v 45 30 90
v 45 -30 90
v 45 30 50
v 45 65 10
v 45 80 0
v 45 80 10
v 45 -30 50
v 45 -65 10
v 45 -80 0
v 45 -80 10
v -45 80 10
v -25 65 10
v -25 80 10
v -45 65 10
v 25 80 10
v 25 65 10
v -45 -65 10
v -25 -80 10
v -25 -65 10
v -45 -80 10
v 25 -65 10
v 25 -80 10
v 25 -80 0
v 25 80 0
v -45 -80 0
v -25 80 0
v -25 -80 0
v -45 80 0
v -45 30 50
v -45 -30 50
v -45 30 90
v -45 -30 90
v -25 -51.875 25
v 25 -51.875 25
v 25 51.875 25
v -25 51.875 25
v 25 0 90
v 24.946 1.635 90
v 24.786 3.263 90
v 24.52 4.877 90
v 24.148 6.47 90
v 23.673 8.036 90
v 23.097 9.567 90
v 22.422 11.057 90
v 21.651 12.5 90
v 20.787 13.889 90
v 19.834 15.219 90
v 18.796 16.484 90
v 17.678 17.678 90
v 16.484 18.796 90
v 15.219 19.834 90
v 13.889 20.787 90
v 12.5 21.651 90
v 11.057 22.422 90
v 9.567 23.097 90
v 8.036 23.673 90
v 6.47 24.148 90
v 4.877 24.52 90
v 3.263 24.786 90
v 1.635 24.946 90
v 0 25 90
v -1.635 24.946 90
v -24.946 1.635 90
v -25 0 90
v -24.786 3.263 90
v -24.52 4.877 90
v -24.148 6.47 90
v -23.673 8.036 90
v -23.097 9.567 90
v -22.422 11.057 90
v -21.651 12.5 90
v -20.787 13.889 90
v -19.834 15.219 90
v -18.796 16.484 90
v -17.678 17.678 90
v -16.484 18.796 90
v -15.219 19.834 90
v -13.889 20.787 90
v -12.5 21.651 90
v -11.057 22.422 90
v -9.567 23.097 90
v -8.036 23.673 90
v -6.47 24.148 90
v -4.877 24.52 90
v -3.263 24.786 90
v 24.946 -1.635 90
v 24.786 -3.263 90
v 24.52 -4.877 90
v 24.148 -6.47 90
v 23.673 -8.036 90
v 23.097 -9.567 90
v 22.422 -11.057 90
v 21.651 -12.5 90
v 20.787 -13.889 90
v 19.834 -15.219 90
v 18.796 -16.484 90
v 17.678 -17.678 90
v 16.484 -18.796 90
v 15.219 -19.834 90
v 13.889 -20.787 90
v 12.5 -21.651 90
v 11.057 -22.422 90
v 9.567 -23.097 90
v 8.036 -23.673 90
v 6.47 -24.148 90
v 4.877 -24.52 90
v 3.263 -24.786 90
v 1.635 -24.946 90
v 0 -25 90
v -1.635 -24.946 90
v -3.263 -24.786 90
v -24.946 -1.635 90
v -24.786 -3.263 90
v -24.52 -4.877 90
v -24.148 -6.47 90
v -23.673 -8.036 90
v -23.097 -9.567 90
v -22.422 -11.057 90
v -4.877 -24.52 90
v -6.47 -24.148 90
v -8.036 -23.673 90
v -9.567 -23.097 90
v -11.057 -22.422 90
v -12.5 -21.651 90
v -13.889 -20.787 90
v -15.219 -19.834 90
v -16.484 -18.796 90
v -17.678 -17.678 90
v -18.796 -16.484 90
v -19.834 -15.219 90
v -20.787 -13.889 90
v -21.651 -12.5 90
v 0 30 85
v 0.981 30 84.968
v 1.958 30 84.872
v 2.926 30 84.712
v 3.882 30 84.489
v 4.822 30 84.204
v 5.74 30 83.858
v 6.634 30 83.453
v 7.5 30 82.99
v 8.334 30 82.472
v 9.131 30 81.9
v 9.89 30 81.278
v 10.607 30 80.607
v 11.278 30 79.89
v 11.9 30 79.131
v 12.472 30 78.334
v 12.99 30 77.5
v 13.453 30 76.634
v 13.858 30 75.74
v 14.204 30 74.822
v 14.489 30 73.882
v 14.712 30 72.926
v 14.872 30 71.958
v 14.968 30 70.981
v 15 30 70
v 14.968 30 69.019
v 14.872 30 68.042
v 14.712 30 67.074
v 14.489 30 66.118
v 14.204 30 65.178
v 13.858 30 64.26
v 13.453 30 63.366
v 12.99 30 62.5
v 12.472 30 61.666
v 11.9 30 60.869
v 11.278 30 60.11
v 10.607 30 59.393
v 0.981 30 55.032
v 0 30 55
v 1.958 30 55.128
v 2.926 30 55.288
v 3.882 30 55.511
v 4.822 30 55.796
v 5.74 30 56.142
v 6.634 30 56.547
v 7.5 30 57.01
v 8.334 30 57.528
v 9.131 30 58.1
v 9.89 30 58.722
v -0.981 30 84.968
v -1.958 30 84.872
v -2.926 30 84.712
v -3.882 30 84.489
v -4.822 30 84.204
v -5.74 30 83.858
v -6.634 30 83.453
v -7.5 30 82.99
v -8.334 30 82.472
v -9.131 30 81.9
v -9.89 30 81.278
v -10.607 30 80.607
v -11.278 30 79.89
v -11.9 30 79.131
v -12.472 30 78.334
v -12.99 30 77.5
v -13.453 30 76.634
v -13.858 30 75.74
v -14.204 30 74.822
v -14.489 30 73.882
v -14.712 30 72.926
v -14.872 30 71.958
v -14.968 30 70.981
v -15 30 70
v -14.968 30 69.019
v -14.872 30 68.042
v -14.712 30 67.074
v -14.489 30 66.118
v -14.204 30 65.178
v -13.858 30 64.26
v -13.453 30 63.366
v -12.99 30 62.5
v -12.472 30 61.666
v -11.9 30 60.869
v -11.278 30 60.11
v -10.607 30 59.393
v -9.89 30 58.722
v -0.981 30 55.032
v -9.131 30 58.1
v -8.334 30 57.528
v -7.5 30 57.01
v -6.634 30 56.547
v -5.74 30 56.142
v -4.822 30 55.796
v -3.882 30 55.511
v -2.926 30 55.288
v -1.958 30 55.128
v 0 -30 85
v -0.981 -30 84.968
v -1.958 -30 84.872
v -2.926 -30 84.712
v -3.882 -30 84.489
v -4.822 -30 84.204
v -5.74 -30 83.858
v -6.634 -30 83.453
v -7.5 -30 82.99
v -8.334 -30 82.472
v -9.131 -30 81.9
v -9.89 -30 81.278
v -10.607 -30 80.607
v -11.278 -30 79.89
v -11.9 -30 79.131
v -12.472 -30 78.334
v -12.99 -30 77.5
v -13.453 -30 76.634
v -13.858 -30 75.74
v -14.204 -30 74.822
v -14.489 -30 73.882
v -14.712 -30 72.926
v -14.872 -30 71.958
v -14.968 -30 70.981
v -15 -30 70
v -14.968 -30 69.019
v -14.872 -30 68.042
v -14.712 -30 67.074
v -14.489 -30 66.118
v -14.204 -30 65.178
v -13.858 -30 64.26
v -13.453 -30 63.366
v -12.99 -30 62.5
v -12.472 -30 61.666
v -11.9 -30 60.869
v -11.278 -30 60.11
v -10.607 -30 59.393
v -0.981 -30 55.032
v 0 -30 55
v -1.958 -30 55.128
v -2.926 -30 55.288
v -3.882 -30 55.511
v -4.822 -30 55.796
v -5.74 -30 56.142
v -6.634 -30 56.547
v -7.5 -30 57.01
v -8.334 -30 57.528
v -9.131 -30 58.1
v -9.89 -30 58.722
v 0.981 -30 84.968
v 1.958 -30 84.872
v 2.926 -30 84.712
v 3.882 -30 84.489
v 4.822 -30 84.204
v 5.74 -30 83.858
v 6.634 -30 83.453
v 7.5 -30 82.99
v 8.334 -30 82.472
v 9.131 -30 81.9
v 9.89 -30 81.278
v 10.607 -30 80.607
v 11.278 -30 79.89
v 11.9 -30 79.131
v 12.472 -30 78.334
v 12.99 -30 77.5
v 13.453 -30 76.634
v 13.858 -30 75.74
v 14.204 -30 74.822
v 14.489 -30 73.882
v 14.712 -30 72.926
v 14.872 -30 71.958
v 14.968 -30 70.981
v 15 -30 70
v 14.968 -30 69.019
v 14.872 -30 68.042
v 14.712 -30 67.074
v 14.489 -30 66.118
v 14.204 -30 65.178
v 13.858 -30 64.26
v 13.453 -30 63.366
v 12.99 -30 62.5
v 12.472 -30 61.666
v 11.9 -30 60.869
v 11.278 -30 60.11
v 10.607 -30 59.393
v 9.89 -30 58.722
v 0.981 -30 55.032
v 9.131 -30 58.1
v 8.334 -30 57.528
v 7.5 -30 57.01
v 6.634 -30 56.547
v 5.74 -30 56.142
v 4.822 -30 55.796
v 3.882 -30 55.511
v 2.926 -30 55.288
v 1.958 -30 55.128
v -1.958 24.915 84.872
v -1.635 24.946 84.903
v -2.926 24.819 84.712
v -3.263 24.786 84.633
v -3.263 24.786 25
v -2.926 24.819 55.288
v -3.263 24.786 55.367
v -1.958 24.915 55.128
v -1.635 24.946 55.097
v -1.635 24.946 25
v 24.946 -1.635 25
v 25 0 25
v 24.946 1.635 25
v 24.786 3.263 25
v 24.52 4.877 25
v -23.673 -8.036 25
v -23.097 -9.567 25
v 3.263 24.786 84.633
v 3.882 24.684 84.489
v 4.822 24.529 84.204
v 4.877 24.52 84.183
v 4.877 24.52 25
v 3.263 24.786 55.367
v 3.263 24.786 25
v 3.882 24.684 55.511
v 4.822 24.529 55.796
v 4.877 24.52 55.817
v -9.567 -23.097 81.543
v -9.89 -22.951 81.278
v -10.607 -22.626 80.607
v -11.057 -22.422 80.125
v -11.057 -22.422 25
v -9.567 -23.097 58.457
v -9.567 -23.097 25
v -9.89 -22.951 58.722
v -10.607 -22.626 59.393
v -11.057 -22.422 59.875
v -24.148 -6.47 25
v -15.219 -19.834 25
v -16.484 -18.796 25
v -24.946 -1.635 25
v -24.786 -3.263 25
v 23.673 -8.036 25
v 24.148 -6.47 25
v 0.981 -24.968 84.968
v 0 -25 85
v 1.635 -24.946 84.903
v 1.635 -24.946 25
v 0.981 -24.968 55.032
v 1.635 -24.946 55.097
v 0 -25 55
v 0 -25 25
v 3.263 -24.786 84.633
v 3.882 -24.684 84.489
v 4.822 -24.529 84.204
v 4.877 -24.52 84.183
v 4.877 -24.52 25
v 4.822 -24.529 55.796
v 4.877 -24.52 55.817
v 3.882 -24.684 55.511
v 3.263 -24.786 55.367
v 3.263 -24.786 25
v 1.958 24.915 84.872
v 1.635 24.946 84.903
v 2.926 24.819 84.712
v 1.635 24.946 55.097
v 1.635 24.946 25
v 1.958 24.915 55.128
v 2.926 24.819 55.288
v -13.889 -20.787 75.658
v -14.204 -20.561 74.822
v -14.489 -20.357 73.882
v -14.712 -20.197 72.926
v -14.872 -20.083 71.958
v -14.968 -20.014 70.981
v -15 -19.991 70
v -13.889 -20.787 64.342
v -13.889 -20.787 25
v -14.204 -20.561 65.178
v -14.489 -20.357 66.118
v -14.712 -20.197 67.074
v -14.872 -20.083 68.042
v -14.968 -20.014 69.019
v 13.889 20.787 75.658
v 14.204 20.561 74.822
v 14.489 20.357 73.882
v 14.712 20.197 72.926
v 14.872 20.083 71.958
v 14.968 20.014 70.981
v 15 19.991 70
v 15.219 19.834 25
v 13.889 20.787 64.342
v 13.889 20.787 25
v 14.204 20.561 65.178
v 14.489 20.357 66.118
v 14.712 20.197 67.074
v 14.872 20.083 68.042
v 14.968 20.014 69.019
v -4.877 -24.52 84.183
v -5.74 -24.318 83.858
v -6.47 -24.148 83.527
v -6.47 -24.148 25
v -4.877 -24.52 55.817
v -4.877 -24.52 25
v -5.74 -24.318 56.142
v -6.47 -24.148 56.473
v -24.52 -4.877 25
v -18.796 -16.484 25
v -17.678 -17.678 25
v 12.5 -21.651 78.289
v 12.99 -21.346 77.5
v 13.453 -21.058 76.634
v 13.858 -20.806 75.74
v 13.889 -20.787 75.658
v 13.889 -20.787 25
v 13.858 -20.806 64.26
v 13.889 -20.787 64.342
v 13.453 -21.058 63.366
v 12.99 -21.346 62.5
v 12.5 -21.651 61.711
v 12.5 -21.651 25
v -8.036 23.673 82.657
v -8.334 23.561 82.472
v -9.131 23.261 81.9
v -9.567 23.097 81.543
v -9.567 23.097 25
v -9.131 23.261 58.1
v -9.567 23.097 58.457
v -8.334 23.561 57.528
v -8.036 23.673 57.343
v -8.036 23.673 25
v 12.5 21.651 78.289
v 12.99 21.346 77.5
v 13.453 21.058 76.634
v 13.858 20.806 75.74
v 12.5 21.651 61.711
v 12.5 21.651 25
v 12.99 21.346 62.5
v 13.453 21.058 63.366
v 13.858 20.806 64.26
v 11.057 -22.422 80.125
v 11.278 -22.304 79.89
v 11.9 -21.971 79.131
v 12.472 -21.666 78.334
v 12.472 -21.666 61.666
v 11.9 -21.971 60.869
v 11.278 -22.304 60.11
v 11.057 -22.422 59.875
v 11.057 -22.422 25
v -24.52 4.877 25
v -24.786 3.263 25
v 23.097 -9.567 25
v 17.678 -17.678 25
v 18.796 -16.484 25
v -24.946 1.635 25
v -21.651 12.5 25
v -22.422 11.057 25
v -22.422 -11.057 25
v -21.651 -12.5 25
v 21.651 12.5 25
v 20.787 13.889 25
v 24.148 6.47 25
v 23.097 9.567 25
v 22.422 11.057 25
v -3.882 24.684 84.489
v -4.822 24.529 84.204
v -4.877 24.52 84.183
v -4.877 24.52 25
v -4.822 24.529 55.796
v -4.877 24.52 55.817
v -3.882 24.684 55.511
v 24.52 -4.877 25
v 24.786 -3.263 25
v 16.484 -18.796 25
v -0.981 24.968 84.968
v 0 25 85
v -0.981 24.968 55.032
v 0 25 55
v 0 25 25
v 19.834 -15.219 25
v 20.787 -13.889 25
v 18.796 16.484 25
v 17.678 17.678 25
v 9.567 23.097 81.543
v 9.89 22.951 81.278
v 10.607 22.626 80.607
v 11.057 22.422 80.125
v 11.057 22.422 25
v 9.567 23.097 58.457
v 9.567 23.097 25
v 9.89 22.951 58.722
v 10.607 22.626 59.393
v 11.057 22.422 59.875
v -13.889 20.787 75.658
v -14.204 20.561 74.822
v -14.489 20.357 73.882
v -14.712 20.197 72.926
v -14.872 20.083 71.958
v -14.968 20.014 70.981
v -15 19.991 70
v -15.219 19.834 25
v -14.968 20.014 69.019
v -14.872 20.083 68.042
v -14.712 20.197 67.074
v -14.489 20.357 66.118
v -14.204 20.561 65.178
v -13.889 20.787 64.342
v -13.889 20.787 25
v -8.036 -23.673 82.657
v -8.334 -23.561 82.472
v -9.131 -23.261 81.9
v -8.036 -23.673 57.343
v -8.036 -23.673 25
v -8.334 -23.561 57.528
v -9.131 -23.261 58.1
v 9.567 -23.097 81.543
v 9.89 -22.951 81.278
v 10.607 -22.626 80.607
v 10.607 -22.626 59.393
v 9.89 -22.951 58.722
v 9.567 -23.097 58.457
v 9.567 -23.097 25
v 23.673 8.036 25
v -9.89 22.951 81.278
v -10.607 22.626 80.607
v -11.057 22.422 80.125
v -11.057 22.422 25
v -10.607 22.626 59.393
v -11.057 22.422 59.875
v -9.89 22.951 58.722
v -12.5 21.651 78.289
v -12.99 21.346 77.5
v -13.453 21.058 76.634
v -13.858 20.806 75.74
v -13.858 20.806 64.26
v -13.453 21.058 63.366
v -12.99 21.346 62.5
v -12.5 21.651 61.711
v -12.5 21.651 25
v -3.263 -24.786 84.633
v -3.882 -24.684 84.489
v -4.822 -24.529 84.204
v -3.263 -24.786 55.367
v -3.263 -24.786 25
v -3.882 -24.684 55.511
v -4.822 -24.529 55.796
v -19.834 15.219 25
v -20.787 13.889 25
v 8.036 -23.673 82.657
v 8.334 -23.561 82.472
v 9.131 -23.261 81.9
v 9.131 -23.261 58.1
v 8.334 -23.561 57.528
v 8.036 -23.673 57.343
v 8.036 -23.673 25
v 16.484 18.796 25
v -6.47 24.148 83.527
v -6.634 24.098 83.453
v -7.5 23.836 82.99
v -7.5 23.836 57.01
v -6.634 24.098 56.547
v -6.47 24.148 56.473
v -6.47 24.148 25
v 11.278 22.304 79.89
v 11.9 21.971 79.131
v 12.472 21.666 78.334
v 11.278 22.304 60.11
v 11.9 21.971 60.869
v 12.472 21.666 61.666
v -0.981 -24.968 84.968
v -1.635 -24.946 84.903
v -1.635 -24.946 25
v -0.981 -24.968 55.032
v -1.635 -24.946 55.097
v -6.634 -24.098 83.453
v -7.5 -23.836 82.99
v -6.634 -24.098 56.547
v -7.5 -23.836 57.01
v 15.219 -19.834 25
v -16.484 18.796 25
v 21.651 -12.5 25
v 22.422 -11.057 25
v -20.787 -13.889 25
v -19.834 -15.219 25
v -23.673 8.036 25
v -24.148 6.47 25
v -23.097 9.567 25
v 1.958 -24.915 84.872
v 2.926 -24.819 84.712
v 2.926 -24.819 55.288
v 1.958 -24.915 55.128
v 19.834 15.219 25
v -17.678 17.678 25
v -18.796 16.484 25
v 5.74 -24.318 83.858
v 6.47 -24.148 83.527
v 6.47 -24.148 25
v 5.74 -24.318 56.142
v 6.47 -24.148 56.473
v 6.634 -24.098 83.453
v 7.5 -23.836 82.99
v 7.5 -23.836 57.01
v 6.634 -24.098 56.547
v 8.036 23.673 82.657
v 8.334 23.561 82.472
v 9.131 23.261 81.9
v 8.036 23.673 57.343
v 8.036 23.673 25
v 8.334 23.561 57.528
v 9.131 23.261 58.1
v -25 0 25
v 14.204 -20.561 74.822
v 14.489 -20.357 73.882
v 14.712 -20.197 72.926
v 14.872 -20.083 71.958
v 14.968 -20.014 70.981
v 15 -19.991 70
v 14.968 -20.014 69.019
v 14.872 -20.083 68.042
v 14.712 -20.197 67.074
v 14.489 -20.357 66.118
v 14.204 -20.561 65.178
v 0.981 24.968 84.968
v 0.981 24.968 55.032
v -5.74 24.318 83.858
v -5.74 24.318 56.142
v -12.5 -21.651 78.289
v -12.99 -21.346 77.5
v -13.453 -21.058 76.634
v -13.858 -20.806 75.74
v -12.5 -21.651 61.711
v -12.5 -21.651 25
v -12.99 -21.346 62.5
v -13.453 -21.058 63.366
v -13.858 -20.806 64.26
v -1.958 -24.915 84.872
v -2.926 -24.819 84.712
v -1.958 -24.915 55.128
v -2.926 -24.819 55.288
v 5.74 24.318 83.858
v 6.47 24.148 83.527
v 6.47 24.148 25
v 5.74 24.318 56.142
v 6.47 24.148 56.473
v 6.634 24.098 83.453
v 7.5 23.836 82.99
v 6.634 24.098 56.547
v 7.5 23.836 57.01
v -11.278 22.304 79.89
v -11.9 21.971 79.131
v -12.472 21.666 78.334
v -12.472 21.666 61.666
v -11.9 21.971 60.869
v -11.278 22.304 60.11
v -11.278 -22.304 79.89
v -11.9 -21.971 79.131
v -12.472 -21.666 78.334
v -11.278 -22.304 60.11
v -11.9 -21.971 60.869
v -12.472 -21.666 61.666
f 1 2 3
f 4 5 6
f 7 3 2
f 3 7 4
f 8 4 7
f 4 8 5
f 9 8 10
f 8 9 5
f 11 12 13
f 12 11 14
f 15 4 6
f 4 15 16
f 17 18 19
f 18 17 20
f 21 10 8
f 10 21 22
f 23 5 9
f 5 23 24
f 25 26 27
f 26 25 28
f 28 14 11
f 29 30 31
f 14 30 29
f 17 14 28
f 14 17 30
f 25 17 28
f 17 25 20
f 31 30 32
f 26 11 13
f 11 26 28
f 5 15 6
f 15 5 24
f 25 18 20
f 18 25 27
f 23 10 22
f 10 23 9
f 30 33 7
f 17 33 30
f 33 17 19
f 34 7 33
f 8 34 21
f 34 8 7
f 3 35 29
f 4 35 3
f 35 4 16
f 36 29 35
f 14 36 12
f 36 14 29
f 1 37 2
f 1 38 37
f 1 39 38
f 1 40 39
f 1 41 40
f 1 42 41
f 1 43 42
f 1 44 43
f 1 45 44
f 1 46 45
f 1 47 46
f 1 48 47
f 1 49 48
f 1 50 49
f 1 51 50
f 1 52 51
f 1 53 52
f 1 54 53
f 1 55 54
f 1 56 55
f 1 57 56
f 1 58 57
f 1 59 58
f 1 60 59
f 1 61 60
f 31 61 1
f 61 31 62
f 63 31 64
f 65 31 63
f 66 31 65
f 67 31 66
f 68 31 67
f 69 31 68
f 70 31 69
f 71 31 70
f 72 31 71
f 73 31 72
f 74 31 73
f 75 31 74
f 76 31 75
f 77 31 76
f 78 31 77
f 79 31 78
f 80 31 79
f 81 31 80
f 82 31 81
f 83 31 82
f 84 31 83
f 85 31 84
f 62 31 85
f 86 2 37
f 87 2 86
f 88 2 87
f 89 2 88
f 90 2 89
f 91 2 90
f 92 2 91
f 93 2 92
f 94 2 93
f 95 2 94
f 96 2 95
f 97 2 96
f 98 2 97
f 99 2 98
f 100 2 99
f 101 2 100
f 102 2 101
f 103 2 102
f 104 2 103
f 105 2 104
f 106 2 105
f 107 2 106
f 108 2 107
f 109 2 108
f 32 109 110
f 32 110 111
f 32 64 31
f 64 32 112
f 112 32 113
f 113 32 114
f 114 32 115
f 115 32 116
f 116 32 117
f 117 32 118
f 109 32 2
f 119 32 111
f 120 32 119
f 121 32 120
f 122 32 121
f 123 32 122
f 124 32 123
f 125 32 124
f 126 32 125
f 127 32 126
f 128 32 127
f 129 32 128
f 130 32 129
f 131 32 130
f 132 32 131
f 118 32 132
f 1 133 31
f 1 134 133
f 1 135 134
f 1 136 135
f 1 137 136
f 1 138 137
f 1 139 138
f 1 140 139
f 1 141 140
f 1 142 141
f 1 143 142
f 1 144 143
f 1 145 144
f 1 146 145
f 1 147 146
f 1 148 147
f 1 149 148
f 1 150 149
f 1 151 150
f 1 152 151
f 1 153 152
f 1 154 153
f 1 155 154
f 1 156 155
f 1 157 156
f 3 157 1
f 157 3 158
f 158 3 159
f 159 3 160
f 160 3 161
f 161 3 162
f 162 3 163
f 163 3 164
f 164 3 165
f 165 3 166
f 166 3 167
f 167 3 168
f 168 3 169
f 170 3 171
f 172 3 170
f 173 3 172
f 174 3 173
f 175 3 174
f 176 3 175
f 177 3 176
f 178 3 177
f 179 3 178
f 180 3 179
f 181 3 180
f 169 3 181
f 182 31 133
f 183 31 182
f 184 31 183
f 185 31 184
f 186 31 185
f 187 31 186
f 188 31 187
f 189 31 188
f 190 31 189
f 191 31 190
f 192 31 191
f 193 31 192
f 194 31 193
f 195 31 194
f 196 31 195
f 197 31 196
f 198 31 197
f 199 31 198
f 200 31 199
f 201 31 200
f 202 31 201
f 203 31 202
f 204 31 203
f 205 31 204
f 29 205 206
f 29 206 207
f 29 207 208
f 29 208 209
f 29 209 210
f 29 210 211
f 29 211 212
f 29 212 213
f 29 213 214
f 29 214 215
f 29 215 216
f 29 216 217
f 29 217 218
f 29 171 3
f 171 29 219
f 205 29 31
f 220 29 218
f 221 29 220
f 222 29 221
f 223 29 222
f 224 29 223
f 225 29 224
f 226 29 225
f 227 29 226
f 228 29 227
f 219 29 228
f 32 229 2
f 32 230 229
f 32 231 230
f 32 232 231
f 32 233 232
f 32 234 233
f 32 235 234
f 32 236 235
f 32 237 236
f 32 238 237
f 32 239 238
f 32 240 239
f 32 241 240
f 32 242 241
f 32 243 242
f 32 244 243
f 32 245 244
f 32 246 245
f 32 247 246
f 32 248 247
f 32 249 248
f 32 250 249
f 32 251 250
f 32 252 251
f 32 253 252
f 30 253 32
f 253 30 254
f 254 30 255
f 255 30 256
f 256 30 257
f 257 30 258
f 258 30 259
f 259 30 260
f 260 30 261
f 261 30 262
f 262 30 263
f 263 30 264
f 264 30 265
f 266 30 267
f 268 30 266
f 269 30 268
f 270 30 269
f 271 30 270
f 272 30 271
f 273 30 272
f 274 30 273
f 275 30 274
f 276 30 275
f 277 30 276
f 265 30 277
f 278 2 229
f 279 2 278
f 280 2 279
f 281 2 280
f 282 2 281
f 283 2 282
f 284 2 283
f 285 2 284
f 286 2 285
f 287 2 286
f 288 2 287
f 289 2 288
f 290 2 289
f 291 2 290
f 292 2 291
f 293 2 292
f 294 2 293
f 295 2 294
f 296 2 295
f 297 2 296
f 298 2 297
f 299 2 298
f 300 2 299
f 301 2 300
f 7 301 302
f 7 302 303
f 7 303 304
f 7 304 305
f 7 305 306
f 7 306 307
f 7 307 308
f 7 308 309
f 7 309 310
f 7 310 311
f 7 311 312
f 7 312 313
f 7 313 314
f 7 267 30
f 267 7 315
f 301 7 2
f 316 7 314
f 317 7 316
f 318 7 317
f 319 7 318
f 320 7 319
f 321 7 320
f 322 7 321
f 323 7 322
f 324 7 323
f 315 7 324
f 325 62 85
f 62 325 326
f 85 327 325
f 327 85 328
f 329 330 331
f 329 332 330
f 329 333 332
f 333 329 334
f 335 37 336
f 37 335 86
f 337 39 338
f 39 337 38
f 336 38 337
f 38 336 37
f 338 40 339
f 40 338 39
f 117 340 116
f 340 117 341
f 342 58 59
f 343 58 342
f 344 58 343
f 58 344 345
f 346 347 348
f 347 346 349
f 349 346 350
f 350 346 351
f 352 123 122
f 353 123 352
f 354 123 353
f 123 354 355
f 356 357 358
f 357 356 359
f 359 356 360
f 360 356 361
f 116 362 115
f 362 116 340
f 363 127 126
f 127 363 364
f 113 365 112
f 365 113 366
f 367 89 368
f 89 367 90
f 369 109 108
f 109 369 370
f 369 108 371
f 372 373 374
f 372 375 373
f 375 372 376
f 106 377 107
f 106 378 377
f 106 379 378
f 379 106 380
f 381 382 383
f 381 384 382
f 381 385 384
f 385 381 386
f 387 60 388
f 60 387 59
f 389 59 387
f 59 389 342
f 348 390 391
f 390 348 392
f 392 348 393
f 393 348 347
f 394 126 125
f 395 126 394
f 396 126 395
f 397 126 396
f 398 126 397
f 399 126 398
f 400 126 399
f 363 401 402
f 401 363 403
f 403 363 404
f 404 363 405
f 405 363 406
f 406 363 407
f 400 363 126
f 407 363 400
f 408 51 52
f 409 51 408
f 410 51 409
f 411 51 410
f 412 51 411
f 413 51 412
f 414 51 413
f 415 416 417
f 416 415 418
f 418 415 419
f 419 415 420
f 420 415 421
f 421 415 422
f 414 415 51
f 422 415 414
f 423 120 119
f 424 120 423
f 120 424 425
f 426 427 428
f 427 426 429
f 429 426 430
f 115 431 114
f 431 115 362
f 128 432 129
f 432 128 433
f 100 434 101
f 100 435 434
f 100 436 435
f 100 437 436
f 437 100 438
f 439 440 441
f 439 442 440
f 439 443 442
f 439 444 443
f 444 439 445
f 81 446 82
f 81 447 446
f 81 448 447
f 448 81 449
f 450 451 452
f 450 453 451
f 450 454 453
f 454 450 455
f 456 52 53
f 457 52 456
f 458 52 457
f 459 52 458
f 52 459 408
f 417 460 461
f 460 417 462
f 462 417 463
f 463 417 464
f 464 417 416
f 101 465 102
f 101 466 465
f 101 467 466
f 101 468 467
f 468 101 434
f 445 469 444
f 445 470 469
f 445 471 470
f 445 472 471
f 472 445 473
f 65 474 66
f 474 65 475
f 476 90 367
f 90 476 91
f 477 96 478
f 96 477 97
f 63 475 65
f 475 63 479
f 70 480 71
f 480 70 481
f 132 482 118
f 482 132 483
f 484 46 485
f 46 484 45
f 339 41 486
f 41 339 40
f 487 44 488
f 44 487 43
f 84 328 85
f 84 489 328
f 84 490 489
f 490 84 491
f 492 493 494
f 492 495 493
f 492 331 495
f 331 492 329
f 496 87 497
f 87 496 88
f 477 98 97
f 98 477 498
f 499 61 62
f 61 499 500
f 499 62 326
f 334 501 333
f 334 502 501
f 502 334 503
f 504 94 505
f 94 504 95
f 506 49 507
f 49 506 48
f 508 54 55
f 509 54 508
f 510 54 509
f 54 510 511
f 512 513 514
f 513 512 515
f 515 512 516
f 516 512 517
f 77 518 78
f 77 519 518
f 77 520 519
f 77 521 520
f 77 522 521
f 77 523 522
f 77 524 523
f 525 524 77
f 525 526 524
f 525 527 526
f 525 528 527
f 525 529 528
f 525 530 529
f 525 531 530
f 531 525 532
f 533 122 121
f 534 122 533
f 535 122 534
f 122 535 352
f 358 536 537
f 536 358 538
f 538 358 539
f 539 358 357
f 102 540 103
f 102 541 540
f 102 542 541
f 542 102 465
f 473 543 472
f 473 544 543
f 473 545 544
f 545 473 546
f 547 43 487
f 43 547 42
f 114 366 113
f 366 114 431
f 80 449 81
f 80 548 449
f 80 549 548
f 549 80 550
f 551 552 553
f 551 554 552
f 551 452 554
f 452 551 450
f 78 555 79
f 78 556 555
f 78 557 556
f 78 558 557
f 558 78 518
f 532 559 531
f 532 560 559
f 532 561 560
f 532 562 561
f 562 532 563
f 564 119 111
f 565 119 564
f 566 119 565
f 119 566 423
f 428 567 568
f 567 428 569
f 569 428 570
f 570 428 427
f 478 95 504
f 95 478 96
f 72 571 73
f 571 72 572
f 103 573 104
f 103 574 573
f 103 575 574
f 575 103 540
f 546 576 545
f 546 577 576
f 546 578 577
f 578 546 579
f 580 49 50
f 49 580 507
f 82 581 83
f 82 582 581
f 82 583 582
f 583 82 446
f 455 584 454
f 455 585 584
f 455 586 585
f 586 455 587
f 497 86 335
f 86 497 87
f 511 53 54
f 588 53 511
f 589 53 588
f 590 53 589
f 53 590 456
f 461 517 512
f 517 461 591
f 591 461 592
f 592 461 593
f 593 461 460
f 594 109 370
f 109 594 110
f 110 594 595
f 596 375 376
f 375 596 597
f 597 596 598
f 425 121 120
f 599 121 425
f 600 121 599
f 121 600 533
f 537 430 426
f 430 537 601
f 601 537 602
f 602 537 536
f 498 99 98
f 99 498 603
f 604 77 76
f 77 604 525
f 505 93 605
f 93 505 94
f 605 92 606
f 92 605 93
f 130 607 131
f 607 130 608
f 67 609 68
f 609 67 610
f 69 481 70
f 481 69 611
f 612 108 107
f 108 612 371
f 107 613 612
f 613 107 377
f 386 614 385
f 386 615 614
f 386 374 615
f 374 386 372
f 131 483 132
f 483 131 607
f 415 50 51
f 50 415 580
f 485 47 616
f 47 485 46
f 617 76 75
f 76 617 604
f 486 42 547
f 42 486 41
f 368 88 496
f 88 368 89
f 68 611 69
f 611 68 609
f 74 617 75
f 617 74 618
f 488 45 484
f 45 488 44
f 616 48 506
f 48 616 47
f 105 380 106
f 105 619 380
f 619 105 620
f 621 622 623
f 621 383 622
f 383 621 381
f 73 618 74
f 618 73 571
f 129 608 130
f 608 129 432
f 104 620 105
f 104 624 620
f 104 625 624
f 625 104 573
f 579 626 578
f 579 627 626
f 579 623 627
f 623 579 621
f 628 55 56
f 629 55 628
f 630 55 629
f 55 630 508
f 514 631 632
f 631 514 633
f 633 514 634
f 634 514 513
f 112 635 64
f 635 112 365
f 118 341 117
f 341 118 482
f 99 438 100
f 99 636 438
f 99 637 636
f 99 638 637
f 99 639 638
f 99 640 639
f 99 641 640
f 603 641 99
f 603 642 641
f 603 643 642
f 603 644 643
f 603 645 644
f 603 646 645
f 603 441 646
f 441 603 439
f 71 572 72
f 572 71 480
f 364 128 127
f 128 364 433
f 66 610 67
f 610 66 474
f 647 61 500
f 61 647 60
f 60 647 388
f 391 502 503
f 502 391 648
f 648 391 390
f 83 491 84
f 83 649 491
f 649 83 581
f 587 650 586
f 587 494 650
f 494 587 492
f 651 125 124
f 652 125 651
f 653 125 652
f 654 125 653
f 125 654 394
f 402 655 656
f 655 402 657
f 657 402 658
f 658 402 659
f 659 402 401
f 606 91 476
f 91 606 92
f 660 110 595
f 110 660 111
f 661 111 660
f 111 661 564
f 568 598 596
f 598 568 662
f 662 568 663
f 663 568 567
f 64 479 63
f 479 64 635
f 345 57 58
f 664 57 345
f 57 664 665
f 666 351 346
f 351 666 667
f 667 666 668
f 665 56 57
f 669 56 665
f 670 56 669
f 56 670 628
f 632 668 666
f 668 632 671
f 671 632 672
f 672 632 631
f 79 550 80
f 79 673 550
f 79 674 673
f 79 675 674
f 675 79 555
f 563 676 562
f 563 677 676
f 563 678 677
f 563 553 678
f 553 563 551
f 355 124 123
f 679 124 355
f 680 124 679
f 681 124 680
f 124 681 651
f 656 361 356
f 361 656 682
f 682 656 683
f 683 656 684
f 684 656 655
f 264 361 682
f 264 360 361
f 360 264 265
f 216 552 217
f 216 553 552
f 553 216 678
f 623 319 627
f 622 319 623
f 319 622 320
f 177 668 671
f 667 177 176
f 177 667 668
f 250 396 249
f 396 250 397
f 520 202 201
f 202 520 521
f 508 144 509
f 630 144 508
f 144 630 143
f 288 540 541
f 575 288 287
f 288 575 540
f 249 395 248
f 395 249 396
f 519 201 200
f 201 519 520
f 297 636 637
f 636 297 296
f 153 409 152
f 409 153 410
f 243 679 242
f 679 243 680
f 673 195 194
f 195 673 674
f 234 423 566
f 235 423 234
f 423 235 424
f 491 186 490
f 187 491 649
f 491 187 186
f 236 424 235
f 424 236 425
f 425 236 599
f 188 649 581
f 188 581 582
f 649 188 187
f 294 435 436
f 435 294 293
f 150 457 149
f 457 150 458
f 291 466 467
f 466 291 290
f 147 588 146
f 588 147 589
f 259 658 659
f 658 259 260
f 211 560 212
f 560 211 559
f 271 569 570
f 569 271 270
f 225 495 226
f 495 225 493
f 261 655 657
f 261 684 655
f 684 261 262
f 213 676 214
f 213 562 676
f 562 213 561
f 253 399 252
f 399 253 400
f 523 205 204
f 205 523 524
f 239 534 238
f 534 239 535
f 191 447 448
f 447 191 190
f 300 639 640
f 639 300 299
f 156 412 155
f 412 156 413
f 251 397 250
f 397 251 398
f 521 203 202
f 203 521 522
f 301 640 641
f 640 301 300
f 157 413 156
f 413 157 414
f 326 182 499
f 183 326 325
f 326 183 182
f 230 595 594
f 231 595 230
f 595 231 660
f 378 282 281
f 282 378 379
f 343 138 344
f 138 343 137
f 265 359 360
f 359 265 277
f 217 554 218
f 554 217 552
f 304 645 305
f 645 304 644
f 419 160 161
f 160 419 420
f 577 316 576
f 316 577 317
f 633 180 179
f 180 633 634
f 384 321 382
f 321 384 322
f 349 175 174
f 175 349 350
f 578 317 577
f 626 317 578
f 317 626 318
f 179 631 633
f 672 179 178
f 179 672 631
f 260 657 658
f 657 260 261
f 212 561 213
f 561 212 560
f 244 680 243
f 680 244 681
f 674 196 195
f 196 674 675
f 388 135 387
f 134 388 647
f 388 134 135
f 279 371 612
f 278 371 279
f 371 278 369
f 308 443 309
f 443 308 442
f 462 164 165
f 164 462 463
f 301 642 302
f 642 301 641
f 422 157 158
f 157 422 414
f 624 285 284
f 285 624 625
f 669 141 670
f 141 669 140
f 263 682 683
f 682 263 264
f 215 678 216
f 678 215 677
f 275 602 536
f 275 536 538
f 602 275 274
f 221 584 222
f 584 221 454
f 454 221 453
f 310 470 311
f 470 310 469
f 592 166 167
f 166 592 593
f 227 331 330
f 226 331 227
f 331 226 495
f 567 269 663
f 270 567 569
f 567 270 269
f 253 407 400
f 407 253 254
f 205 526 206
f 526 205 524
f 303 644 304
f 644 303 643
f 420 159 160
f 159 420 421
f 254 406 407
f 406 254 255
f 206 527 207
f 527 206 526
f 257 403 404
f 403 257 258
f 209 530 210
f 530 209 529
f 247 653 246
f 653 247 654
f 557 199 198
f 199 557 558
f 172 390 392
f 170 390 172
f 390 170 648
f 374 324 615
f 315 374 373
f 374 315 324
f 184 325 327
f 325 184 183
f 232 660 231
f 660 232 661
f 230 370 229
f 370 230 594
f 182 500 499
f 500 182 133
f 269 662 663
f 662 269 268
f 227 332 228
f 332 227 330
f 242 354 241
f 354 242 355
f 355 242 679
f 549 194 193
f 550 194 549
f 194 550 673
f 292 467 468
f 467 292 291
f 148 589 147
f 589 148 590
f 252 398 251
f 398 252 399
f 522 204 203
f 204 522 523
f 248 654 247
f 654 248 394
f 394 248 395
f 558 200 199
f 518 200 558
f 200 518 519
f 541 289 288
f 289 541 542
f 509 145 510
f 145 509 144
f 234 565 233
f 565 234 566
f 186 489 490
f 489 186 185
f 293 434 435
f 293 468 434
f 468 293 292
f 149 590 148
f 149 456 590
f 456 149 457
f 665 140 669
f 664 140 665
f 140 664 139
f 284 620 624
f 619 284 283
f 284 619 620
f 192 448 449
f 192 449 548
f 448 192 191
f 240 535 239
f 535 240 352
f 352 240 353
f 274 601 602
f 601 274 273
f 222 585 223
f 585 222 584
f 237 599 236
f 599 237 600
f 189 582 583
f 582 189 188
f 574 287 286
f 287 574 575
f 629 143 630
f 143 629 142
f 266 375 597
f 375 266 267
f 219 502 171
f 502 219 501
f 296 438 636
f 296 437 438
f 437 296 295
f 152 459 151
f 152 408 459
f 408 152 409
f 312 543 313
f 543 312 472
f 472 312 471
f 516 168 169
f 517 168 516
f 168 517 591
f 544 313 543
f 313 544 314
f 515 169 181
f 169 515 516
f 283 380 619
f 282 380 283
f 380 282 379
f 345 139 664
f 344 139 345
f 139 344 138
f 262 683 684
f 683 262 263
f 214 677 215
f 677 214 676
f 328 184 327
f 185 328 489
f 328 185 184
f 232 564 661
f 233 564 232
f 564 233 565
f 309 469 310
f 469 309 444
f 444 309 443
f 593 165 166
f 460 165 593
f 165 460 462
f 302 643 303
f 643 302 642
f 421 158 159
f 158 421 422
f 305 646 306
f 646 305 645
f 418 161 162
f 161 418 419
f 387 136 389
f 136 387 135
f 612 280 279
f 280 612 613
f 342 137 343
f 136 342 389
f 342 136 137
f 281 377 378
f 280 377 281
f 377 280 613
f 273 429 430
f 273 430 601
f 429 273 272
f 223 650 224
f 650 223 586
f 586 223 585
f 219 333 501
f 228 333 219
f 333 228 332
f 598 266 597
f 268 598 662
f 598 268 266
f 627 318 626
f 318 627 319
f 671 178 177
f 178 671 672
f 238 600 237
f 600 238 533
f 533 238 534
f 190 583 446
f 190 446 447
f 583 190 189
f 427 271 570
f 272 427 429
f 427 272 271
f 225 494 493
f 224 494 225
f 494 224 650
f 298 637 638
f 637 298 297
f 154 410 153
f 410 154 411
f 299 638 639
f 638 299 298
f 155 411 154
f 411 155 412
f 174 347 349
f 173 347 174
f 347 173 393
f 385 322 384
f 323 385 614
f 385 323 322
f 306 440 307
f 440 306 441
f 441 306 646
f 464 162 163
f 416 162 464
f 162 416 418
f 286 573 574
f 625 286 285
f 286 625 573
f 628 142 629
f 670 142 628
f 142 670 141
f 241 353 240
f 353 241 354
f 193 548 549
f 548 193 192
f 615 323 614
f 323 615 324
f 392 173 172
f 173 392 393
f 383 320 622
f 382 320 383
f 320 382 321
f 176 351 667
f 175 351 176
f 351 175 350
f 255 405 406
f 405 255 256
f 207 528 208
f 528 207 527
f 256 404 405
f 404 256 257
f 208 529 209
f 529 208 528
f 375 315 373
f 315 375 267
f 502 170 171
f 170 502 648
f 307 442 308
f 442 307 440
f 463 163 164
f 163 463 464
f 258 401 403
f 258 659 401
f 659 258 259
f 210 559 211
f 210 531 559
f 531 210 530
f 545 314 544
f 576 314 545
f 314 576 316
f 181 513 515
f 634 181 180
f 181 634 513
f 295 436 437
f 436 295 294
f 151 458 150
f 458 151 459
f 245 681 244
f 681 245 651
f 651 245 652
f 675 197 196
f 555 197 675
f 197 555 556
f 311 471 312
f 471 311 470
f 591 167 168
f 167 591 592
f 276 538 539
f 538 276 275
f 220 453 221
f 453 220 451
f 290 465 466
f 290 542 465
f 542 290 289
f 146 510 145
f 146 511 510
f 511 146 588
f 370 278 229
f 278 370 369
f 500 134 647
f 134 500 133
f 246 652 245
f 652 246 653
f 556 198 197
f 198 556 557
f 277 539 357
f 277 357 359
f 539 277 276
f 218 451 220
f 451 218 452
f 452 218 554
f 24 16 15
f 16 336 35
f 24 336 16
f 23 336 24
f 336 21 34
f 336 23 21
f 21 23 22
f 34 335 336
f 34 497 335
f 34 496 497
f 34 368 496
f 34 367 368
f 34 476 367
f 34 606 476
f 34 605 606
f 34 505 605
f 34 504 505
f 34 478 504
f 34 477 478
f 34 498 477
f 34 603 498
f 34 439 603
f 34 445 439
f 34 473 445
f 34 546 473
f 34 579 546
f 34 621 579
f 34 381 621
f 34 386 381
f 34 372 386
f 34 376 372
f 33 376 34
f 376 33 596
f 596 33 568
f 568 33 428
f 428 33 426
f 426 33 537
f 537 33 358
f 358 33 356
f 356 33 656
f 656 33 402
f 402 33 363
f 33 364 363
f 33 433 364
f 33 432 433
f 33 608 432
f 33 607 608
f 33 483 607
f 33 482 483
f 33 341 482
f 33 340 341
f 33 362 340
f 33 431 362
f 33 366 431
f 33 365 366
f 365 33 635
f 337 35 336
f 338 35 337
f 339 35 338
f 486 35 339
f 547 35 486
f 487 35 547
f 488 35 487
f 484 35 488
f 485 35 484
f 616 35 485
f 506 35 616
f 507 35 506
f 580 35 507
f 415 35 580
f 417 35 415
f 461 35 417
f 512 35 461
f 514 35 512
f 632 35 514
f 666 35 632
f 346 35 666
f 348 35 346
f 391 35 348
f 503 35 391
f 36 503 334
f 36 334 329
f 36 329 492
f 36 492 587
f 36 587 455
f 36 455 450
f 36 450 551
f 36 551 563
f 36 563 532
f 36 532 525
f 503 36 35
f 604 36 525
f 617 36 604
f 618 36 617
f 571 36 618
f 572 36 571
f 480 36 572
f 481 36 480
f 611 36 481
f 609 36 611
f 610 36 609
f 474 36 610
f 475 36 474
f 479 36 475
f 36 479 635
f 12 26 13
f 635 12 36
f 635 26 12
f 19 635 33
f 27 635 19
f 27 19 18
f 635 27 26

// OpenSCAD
$fn = 96;


base_x = 90;
base_y = 160;
base_z = 10;

trap_x = 90;
trap_y_bottom = 130;
trap_y_top = 60;
trap_z = 40;
trap_y_shift = 0;

top_x = 90;
top_y = 60;
top_z = 40;

top_y_shift = trap_y_shift;

hole_z_d = 50;
hole_z_x = 0;
hole_z_y = 0;

hole_y_d = 30;
hole_y_x = 0;

hole_y_z = base_z + trap_z + top_z / 2;

slot_x = 50;
slot_y = 162;
slot_z = 25;

slot_y_start = -base_y / 2 - 1;

eps = 0.2;


module base_block() {
    translate([-base_x / 2, -base_y / 2, 0])
        cube([base_x, base_y, base_z]);
}


module top_block() {
    translate([
        -top_x / 2,
        top_y_shift - top_y / 2,
        base_z + trap_z
    ])
        cube([top_x, top_y, top_z]);
}


module trapezoid_body() {
    x0 = -trap_x / 2;
    x1 =  trap_x / 2;

    z0 = base_z;
    z1 = base_z + trap_z;

    yb0 = -trap_y_bottom / 2;
    yb1 =  trap_y_bottom / 2;

    yt0 = trap_y_shift - trap_y_top / 2;
    yt1 = trap_y_shift + trap_y_top / 2;

    polyhedron(
        points = [
            [x0, yb0, z0],
            [x1, yb0, z0],
            [x1, yb1, z0],
            [x0, yb1, z0],

            [x0, yt0, z1],
            [x1, yt0, z1],
            [x1, yt1, z1],
            [x0, yt1, z1]
        ],
        faces = [
            [0, 1, 2, 3],
            [4, 7, 6, 5],

            [0, 4, 5, 1],
            [1, 5, 6, 2],
            [2, 6, 7, 3],
            [3, 7, 4, 0]
        ]
    );
}


module vertical_z_hole() {
    translate([hole_z_x, hole_z_y, base_z - eps])
        cylinder(
            h = trap_z + top_z + 2 * eps,
            d = hole_z_d
        );
}


module horizontal_y_hole() {
    translate([hole_y_x, top_y_shift, hole_y_z])
        rotate([90, 0, 0])
            cylinder(
                h = top_y + 2 * eps,
                d = hole_y_d,
                center = true
            );
}


module rectangular_slot() {
    translate([
        -slot_x / 2,
        slot_y_start,
        -eps
    ])
        cube([
            slot_x,
            slot_y,
            slot_z + eps
        ]);
}


difference() {
    union() {
        base_block();
        trapezoid_body();
        top_block();
    }

    vertical_z_hole();
    horizontal_y_hole();
    rectangular_slot();
}
